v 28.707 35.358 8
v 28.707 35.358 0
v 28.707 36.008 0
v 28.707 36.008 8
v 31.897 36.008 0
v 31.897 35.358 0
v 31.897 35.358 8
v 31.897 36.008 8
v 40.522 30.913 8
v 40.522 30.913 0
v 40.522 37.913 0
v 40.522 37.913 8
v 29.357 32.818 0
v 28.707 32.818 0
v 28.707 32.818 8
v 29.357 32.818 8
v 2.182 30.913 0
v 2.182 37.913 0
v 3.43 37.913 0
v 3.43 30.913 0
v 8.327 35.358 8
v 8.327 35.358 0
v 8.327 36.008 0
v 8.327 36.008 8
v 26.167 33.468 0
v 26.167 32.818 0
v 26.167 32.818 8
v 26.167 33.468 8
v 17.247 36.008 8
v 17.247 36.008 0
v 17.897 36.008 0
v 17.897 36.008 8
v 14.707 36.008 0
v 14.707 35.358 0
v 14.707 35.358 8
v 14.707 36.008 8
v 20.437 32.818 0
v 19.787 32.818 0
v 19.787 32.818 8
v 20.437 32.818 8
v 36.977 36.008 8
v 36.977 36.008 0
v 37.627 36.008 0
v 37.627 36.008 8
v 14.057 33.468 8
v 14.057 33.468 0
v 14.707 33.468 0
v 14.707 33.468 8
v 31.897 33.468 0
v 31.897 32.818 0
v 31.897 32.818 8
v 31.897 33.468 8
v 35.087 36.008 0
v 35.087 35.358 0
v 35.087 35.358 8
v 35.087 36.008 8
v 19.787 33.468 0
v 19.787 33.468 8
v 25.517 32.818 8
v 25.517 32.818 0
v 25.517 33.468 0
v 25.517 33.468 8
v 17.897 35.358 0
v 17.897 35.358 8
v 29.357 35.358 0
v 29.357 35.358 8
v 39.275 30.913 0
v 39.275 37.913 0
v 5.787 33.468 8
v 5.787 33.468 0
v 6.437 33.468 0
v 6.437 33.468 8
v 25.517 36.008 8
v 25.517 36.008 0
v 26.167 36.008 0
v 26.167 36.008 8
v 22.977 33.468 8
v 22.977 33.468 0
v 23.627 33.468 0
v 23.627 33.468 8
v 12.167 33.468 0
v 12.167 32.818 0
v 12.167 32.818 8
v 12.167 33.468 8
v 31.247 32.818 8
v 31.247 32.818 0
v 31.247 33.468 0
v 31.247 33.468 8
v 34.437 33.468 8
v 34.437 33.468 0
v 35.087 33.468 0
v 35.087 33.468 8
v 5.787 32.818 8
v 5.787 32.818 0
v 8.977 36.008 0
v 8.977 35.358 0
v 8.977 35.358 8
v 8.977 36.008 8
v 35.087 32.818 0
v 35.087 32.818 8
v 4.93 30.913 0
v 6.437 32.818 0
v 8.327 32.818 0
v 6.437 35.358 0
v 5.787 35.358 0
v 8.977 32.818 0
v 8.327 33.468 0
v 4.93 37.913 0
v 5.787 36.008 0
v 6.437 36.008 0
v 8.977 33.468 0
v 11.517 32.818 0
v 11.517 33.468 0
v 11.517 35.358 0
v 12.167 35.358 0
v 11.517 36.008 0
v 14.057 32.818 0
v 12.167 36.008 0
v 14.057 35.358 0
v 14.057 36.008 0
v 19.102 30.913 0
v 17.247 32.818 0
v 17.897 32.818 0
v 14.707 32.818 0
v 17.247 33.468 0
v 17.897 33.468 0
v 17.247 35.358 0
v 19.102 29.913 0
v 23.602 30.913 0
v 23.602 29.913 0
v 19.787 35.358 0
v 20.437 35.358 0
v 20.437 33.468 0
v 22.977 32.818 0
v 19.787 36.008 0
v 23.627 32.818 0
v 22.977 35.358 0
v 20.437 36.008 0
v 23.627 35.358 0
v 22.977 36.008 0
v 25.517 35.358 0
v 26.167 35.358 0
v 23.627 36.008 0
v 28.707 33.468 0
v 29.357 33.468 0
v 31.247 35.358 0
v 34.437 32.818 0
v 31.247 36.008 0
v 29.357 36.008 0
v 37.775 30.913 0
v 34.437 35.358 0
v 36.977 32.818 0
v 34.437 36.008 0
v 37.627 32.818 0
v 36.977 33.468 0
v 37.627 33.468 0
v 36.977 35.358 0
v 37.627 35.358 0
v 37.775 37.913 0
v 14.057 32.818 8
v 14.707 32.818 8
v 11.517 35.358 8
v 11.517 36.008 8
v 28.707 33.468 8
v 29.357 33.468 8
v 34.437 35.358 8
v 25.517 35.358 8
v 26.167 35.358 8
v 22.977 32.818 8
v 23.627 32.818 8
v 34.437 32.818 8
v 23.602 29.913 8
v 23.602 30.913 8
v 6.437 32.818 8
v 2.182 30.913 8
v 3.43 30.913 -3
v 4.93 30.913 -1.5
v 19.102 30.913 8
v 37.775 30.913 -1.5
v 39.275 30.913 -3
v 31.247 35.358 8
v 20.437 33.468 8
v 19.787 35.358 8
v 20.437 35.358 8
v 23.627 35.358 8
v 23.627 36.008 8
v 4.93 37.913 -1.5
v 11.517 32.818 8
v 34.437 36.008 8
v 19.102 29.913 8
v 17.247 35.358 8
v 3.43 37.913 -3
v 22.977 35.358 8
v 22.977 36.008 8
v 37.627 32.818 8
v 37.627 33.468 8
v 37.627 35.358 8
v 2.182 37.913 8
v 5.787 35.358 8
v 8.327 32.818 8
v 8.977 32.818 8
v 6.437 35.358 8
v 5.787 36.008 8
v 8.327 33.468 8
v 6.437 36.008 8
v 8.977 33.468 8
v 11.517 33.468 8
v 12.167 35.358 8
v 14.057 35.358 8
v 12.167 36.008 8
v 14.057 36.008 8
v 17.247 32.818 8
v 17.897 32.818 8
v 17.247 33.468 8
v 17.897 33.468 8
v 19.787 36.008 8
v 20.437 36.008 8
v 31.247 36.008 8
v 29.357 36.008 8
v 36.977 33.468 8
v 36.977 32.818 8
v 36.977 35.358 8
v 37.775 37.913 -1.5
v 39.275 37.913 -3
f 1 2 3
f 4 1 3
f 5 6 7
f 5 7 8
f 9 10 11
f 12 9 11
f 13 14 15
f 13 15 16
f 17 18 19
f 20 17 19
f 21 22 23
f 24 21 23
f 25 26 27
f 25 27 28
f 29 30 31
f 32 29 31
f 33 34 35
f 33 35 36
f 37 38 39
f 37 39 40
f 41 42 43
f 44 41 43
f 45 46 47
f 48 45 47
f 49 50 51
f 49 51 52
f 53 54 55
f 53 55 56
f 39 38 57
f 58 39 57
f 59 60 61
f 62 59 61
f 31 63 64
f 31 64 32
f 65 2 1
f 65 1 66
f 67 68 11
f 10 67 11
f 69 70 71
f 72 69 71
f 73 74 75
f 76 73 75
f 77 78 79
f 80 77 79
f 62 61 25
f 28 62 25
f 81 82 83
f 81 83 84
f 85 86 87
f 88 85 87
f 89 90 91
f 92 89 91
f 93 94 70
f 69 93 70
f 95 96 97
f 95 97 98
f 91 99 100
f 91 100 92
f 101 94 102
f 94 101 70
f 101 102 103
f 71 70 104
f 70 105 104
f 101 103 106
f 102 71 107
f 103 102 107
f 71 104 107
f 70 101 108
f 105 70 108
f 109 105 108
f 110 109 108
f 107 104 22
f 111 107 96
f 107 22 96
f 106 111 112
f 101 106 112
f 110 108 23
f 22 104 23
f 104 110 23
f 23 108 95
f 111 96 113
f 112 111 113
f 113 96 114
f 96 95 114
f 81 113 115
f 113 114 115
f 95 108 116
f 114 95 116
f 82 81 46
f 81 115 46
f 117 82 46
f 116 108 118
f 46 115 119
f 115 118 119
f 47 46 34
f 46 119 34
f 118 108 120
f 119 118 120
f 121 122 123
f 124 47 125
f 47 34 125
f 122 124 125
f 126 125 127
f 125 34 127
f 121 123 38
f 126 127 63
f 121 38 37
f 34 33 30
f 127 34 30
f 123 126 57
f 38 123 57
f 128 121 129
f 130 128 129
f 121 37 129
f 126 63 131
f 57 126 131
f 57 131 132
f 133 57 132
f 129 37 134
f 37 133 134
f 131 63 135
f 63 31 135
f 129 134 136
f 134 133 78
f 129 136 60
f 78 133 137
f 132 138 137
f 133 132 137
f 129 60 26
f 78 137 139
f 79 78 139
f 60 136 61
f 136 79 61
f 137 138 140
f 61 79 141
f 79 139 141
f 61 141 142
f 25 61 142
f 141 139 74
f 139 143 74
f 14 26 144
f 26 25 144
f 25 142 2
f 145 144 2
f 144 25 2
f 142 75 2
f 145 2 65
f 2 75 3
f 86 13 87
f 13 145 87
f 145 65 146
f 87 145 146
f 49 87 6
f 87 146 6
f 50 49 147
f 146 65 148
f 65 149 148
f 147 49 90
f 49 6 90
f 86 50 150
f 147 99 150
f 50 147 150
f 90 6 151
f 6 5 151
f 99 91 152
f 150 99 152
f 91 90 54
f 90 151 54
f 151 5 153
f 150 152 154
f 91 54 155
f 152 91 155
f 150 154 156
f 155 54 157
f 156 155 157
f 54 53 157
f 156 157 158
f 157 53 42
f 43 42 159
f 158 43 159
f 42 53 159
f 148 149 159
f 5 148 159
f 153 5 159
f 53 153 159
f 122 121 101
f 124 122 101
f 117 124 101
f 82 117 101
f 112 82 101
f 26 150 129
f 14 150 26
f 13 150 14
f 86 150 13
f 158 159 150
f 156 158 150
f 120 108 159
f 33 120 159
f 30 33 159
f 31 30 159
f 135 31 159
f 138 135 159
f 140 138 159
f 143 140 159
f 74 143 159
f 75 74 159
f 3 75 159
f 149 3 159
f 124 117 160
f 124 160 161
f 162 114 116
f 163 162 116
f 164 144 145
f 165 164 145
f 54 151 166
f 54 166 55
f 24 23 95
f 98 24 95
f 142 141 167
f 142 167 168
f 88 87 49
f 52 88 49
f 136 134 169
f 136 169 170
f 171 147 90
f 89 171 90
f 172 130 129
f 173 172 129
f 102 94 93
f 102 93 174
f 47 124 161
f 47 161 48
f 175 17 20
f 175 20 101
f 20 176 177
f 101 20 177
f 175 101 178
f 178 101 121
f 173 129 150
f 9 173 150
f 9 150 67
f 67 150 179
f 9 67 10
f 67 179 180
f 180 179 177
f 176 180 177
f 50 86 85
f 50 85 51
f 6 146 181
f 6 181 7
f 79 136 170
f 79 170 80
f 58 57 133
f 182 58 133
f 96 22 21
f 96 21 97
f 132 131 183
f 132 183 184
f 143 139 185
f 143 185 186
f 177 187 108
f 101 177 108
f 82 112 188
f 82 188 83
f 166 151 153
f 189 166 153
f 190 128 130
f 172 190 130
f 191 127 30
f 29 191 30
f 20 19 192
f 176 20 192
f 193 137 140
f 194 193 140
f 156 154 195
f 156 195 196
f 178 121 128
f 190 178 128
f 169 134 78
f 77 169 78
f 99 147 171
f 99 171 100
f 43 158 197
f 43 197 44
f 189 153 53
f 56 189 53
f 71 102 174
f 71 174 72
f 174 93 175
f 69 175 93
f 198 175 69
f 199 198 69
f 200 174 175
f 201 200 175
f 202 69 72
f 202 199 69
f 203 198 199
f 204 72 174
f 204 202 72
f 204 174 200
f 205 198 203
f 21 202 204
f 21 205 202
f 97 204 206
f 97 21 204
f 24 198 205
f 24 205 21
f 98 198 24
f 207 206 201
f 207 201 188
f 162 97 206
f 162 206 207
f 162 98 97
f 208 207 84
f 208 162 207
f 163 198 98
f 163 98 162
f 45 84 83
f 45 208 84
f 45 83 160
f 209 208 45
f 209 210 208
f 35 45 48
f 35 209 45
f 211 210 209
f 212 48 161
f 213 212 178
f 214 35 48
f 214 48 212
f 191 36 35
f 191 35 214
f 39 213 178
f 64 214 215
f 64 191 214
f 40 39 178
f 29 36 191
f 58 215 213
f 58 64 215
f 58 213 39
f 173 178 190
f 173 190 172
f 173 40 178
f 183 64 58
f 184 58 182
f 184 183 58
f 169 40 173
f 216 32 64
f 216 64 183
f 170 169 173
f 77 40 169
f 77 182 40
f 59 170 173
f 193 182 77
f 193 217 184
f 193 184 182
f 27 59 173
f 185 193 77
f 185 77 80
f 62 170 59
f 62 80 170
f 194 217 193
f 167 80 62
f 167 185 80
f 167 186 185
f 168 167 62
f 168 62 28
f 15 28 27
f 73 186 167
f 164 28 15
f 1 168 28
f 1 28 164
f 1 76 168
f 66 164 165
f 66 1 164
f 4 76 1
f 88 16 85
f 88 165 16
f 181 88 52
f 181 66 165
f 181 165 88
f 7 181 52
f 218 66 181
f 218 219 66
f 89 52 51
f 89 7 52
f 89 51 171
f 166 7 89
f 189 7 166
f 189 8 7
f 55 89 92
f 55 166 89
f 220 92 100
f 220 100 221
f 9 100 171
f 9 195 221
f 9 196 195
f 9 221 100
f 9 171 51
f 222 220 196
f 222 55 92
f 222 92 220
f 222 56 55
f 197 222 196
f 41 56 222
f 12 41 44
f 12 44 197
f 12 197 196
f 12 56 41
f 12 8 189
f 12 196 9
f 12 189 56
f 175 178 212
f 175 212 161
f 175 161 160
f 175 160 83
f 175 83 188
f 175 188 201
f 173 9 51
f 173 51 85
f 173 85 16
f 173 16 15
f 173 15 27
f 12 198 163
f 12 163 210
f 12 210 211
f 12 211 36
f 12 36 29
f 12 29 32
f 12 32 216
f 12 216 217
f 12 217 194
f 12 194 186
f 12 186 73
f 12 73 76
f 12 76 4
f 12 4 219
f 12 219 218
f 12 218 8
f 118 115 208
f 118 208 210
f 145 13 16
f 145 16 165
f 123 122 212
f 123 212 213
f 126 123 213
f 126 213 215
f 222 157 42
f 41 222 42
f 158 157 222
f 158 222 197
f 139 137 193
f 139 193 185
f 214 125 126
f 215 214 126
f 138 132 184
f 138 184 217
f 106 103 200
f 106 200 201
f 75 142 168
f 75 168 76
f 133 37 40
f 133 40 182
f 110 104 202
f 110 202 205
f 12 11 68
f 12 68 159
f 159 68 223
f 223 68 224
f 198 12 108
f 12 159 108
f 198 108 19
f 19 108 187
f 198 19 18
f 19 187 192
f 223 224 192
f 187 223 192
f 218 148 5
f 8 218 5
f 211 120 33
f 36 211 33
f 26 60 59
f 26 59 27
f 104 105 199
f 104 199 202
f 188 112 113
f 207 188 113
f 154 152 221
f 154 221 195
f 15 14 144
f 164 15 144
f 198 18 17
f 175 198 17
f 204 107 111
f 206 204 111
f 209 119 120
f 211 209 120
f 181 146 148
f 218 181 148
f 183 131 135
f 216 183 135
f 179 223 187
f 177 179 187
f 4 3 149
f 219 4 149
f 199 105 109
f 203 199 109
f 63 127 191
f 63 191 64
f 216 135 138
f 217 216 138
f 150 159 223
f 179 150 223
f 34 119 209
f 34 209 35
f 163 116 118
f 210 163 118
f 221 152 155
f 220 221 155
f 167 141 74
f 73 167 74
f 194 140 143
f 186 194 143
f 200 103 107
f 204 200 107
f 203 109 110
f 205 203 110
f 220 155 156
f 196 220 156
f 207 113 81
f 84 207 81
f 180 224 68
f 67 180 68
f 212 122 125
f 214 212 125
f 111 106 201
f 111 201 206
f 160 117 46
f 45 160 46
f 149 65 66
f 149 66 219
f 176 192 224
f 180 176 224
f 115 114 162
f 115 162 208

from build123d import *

# Parameters (mm, degrees)
SKETCH1_W           = 0.65
SKETCH1_H           = 0.65
BOSS_EXTRUDE1_DEPTH = 8
BOSS_EXTRUDE2_DEPTH = 7


with BuildPart() as part:
    # Sketch1 → Boss-Extrude1 (new body)
    with BuildSketch(Plane.XY):
        Polygon((2.182384268, 30.912610308), (19.102384268, 30.912610308), (19.102384268, 29.912610308), (23.602384268, 29.912610308), (23.602384268, 30.912610308), (40.522384268, 30.912610308), (40.522384268, 37.912610308), (2.182384268, 37.912610308), align=None)
        with Locations((6.112384268, 33.142610308)):
            Rectangle(SKETCH1_W, SKETCH1_H, mode=Mode.SUBTRACT)
        with Locations((8.652384268, 33.142610308)):
            Rectangle(SKETCH1_W, SKETCH1_H, mode=Mode.SUBTRACT)
        with Locations((6.112384268, 35.682610308)):
            Rectangle(SKETCH1_W, SKETCH1_H, mode=Mode.SUBTRACT)
        with Locations((8.652384268, 35.682610308)):
            Rectangle(SKETCH1_W, SKETCH1_H, mode=Mode.SUBTRACT)
        with Locations((14.382384268, 33.142610308)):
            Rectangle(SKETCH1_W, SKETCH1_H, mode=Mode.SUBTRACT)
        with Locations((11.842384268, 35.682610308)):
            Rectangle(SKETCH1_W, SKETCH1_H, mode=Mode.SUBTRACT)
        with Locations((11.842384268, 33.142610308)):
            Rectangle(SKETCH1_W, SKETCH1_H, mode=Mode.SUBTRACT)
        with Locations((14.382384268, 35.682610308)):
            Rectangle(SKETCH1_W, SKETCH1_H, mode=Mode.SUBTRACT)
        with Locations((20.112384268, 33.142610308)):
            Rectangle(SKETCH1_W, SKETCH1_H, mode=Mode.SUBTRACT)
        with Locations((17.572384268, 35.682610308)):
            Rectangle(SKETCH1_W, SKETCH1_H, mode=Mode.SUBTRACT)
        with Locations((17.572384268, 33.142610308)):
            Rectangle(SKETCH1_W, SKETCH1_H, mode=Mode.SUBTRACT)
        with Locations((20.112384268, 35.682610308)):
            Rectangle(SKETCH1_W, SKETCH1_H, mode=Mode.SUBTRACT)
        with Locations((25.842384268, 33.142610308)):
            Rectangle(SKETCH1_W, SKETCH1_H, mode=Mode.SUBTRACT)
        with Locations((23.302384268, 35.682610308)):
            Rectangle(SKETCH1_W, SKETCH1_H, mode=Mode.SUBTRACT)
        with Locations((23.302384268, 33.142610308)):
            Rectangle(SKETCH1_W, SKETCH1_H, mode=Mode.SUBTRACT)
        with Locations((25.842384268, 35.682610308)):
            Rectangle(SKETCH1_W, SKETCH1_H, mode=Mode.SUBTRACT)
        with Locations((31.572384268, 33.142610308)):
            Rectangle(SKETCH1_W, SKETCH1_H, mode=Mode.SUBTRACT)
        with Locations((29.032384268, 35.682610308)):
            Rectangle(SKETCH1_W, SKETCH1_H, mode=Mode.SUBTRACT)
        with Locations((29.032384268, 33.142610308)):
            Rectangle(SKETCH1_W, SKETCH1_H, mode=Mode.SUBTRACT)
        with Locations((31.572384268, 35.682610308)):
            Rectangle(SKETCH1_W, SKETCH1_H, mode=Mode.SUBTRACT)
        with Locations((37.302384268, 33.142610308)):
            Rectangle(SKETCH1_W, SKETCH1_H, mode=Mode.SUBTRACT)
        with Locations((34.762384268, 35.682610308)):
            Rectangle(SKETCH1_W, SKETCH1_H, mode=Mode.SUBTRACT)
        with Locations((34.762384268, 33.142610308)):
            Rectangle(SKETCH1_W, SKETCH1_H, mode=Mode.SUBTRACT)
        with Locations((37.302384268, 35.682610308)):
            Rectangle(SKETCH1_W, SKETCH1_H, mode=Mode.SUBTRACT)
    extrude(amount=BOSS_EXTRUDE1_DEPTH)

    # Sketch2 → Boss-Extrude2 (add)
    with BuildSketch(Plane(origin=(0, 37.912610308, 0), x_dir=(1, 0, 0), z_dir=(0, 1, 0))):
        Polygon((3.429740031, 0), (3.429740031, 3), (39.275028505, 3), (39.275028505, 0), (37.775028505, 0), (37.775028505, 1.5), (4.929740031, 1.5), (4.929740031, 0), align=None)
    extrude(amount=-BOSS_EXTRUDE2_DEPTH)


solid = part.part
